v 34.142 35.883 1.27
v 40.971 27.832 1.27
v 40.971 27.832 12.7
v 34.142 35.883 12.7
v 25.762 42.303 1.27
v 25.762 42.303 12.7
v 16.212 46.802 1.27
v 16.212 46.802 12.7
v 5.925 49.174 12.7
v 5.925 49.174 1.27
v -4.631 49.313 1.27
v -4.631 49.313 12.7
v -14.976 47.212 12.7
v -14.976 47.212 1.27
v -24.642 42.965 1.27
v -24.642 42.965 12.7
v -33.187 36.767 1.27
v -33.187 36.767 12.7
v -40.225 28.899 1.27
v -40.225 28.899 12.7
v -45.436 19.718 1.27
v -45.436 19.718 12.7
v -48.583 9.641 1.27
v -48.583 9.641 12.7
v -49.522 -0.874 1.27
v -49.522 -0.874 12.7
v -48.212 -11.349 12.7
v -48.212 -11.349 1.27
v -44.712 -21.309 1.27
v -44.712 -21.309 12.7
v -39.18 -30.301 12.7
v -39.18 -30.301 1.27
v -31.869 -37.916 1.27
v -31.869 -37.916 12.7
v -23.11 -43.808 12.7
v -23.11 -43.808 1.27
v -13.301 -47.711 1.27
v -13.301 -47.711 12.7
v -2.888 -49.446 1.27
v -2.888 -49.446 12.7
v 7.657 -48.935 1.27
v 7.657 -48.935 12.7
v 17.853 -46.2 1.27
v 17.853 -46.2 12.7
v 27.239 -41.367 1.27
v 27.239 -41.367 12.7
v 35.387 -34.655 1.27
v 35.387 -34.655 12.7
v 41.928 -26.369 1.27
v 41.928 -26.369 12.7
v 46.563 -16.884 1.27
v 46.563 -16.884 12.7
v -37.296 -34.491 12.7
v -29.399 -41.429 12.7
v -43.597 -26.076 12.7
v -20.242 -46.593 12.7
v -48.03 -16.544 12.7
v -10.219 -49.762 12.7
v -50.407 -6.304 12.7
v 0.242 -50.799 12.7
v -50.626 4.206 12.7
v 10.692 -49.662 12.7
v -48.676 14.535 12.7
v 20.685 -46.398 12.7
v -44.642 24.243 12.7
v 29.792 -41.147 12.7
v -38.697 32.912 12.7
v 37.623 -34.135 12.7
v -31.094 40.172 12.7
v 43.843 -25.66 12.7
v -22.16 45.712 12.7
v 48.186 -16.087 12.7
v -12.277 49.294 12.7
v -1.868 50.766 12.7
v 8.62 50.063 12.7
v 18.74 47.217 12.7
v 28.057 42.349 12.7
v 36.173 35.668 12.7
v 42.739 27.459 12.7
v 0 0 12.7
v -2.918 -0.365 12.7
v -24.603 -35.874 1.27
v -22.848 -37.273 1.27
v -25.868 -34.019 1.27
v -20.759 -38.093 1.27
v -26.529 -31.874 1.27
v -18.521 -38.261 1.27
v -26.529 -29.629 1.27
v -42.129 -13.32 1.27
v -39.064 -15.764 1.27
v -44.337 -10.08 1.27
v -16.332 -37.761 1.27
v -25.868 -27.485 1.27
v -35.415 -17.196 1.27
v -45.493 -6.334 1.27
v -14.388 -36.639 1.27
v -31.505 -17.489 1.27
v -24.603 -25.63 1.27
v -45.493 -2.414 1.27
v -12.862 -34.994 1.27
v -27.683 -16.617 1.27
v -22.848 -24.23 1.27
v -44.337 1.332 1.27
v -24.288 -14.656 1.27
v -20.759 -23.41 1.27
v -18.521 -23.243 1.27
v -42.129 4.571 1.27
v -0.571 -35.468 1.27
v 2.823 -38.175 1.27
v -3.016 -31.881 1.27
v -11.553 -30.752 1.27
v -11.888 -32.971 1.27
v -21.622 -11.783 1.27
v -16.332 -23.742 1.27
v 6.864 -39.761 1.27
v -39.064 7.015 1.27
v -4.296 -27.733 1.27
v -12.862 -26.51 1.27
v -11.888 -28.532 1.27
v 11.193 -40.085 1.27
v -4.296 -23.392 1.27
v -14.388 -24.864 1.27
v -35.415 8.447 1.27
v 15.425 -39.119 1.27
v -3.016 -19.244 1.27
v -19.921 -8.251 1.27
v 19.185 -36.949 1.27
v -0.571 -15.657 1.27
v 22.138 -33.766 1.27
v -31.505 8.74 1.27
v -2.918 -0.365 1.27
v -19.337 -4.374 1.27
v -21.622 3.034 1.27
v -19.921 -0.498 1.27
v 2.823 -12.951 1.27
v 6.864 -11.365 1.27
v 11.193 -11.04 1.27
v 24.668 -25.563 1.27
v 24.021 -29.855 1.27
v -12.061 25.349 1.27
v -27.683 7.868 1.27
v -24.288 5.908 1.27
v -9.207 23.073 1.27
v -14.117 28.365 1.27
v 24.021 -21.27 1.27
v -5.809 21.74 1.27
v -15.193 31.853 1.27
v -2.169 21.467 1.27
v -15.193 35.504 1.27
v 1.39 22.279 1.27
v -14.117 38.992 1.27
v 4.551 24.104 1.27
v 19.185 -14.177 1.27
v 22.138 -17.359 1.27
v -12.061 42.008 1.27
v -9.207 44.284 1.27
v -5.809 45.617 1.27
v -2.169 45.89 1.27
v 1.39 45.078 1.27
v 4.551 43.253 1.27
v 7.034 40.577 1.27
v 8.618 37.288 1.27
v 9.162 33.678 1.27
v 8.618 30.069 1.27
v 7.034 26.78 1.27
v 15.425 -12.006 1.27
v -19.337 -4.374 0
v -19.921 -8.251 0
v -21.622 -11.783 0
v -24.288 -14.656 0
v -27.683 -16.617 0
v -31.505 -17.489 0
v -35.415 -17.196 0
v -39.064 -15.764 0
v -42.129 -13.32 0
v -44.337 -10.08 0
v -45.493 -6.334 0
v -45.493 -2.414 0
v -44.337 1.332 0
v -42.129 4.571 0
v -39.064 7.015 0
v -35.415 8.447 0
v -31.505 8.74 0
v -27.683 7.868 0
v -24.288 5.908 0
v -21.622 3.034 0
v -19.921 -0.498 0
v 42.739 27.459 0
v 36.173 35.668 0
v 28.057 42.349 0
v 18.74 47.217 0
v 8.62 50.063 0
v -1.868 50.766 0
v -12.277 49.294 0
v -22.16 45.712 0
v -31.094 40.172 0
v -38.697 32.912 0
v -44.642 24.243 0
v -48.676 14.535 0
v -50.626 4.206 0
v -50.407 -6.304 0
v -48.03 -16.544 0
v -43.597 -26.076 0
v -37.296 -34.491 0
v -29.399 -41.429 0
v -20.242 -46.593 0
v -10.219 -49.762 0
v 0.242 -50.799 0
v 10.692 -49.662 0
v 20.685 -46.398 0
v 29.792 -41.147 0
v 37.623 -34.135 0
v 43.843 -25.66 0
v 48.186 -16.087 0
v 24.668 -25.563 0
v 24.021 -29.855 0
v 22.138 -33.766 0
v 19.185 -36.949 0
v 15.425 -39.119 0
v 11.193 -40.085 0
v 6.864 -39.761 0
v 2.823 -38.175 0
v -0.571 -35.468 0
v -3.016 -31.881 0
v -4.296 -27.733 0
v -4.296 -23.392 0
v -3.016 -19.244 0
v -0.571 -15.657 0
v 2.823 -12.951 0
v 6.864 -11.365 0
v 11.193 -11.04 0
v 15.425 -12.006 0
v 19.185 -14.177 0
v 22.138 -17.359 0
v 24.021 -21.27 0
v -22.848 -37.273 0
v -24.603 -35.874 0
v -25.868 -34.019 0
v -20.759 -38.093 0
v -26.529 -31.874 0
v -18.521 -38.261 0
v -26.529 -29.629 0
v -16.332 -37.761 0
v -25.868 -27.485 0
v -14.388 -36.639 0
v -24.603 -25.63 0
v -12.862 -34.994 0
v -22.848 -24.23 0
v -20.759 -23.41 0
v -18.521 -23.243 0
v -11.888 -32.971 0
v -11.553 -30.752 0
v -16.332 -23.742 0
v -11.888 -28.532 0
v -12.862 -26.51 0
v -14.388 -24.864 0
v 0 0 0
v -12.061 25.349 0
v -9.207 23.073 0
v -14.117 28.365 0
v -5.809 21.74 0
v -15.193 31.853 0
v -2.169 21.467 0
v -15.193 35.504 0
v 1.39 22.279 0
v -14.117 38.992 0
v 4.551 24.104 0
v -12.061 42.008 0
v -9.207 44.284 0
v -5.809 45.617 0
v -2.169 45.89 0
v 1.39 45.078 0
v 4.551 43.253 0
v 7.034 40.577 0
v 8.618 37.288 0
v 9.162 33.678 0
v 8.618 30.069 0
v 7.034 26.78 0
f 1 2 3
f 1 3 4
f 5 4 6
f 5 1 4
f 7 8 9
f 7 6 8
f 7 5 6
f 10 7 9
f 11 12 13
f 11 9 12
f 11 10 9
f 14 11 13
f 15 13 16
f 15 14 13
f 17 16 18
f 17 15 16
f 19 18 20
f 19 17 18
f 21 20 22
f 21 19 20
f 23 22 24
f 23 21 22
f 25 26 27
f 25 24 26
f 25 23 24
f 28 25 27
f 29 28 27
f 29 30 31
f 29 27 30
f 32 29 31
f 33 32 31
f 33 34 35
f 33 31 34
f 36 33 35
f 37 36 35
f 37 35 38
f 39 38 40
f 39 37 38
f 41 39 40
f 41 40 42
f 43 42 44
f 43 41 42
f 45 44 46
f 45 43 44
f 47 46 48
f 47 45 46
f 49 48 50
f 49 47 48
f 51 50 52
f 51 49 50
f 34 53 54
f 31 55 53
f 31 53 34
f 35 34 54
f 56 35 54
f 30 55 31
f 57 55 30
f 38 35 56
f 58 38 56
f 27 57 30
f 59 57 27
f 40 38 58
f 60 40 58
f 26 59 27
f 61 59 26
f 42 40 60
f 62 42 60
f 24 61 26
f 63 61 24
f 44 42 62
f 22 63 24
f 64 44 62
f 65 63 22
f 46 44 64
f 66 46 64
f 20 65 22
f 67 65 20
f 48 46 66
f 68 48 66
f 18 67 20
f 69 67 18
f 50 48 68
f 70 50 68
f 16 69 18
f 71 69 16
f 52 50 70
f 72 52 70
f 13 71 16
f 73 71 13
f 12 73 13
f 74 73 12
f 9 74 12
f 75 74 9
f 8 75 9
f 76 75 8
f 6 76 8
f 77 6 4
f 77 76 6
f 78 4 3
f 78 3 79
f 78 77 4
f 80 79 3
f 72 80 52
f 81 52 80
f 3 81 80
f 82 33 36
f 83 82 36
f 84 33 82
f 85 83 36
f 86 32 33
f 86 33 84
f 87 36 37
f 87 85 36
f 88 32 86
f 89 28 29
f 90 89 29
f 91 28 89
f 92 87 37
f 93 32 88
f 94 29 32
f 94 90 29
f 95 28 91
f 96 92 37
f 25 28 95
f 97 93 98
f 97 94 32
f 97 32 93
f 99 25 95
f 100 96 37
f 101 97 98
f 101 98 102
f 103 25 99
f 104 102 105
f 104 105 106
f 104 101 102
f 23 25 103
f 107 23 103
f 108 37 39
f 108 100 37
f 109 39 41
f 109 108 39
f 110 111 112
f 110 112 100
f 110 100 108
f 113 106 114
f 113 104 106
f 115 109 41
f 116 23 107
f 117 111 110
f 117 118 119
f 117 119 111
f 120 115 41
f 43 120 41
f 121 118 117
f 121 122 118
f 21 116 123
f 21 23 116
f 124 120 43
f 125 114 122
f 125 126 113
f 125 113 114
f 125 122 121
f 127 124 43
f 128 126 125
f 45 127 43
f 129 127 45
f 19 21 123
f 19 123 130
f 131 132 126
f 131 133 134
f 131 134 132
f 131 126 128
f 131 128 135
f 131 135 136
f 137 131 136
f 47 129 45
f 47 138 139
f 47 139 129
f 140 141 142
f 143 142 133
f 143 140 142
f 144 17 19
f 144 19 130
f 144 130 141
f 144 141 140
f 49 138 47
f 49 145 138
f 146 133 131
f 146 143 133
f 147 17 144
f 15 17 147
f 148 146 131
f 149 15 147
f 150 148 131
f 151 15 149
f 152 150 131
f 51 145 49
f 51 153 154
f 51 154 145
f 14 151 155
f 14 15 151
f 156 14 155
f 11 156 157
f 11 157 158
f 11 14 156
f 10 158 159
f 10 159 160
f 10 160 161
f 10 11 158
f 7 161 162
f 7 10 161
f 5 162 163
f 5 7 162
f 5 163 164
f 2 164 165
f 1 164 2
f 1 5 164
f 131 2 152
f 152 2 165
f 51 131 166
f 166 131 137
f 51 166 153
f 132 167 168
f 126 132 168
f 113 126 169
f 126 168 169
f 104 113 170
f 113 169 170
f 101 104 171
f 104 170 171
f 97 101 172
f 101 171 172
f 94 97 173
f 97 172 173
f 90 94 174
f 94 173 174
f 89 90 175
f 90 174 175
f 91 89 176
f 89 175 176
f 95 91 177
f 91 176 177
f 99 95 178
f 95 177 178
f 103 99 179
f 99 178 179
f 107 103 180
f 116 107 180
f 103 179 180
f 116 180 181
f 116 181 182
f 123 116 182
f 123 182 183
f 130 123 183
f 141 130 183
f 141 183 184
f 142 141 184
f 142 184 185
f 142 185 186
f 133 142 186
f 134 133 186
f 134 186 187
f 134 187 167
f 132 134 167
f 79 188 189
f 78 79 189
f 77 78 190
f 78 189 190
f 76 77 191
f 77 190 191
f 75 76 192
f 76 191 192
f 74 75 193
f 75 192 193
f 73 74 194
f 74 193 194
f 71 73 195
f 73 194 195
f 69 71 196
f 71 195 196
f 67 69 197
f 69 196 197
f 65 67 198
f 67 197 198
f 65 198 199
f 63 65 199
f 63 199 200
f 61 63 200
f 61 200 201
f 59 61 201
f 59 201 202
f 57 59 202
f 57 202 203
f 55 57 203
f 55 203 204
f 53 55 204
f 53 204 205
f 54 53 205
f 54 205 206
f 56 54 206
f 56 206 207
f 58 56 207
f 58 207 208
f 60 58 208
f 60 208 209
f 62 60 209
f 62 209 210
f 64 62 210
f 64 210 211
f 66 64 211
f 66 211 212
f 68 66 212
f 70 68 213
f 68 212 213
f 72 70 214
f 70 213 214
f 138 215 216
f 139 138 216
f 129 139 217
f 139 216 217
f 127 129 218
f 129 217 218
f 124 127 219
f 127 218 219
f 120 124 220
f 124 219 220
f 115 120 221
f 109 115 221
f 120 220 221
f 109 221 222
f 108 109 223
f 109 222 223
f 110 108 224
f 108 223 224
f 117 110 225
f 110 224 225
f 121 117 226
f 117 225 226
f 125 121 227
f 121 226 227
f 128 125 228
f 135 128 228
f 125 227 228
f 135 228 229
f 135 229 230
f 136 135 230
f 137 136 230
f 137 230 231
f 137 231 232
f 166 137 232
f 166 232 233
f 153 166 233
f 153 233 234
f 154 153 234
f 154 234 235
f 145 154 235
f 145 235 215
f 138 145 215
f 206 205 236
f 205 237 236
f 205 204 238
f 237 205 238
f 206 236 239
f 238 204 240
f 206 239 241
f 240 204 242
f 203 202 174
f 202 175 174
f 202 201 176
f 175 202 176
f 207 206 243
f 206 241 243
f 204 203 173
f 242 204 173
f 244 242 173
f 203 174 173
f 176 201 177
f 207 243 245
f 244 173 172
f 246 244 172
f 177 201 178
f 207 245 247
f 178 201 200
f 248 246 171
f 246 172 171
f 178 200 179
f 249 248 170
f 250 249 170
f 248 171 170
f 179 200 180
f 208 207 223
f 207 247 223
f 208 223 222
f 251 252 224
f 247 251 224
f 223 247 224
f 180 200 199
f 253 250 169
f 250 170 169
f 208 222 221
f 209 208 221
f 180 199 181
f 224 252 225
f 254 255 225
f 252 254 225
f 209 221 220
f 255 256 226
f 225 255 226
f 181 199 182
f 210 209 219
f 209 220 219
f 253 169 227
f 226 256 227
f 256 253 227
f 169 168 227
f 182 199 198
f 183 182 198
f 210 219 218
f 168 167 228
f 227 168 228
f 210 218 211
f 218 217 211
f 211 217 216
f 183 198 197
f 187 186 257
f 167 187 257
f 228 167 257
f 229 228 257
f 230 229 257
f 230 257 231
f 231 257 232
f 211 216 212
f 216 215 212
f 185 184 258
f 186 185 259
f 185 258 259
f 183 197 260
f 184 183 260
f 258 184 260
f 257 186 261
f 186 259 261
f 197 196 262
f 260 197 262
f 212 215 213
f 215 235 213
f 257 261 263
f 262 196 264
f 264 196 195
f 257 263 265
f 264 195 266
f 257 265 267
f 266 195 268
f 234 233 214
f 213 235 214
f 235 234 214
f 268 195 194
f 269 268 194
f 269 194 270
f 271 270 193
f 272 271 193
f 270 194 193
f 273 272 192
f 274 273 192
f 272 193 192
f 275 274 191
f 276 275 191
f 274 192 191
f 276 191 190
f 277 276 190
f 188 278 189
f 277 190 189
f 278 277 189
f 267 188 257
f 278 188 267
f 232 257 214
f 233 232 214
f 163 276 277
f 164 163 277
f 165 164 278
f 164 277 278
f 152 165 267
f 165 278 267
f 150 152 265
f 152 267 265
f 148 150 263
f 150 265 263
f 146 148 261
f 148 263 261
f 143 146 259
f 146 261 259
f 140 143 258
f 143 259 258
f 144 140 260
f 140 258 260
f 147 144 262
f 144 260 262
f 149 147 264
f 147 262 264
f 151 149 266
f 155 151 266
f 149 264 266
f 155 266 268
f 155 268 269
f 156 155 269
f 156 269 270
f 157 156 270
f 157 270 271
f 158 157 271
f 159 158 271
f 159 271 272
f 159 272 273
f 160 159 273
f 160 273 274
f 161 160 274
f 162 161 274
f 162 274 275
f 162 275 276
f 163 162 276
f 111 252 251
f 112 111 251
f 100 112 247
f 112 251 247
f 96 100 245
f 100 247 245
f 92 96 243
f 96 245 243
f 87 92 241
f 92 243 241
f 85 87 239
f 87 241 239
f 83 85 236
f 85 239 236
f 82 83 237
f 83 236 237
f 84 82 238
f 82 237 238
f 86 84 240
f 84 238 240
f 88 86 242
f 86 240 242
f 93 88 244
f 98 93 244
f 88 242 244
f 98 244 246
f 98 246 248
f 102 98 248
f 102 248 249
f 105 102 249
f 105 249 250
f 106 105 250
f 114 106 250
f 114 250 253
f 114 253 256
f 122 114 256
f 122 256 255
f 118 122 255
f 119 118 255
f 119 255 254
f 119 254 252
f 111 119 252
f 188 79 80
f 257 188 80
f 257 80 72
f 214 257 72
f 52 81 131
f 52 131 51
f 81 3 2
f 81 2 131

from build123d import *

# Parameters (mm, degrees)
F0_R     = 50.8
F1_DEPTH = 12.7
F3_DEPTH = 25.4
F4_T     = -1.27
F5_R     = 7.5301536969
F5_R_2   = 14.5632315152
F5_R_3   = 12.2458947517
F5_R_4   = 13.1514676022
F6_DEPTH = 25.4


with BuildPart() as f1:
    # F0 (on Top) → F1 (new body)
    with BuildSketch(Plane.XY):
        Circle(F0_R)
    extrude(amount=F1_DEPTH)

    # F2 (on face) → F3 (cut)
    with BuildSketch(Plane.XY.offset(12.7)):
        with BuildLine():
            Line((42.7394116495, 27.4587452709), (0, 0))
            Line((0, 0), (48.1856271225, -16.0868063582))
            ThreePointArc((48.1856271225, -16.0868063582), (50.1421472308, -8.1489306714), (50.8, 0))
            ThreePointArc((50.8, 0), (48.7432154858, 14.3087016917), (42.7394116495, 27.4587452709))
        make_face()
    extrude(amount=-F3_DEPTH, mode=Mode.SUBTRACT)

    # F4
    f4_openings = [f1.faces().sort_by_distance(p)[0] for p in [
        (-5.386062, -0.673631, 12.7),
    ]]
    offset(amount=F4_T, openings=f4_openings, kind=Kind.INTERSECTION)

    # F5 (on face) → F6 (cut)
    with BuildSketch(Plane(origin=(0, 0, 0), x_dir=(1, 0, 0), z_dir=(0, 0, -1))):
        with Locations((-19.0832894295, 30.751734972)):
            Circle(F5_R)
        with Locations((10.1048983634, 25.5627222359)):
            Circle(F5_R_2)
        with Locations((-3.0838376842, -33.6784869432)):
            Circle(F5_R_3)
        with Locations((-32.4882343411, 4.3742610142)):
            Circle(F5_R_4)
    extrude(amount=-F6_DEPTH, mode=Mode.SUBTRACT)


solid = f1.part
